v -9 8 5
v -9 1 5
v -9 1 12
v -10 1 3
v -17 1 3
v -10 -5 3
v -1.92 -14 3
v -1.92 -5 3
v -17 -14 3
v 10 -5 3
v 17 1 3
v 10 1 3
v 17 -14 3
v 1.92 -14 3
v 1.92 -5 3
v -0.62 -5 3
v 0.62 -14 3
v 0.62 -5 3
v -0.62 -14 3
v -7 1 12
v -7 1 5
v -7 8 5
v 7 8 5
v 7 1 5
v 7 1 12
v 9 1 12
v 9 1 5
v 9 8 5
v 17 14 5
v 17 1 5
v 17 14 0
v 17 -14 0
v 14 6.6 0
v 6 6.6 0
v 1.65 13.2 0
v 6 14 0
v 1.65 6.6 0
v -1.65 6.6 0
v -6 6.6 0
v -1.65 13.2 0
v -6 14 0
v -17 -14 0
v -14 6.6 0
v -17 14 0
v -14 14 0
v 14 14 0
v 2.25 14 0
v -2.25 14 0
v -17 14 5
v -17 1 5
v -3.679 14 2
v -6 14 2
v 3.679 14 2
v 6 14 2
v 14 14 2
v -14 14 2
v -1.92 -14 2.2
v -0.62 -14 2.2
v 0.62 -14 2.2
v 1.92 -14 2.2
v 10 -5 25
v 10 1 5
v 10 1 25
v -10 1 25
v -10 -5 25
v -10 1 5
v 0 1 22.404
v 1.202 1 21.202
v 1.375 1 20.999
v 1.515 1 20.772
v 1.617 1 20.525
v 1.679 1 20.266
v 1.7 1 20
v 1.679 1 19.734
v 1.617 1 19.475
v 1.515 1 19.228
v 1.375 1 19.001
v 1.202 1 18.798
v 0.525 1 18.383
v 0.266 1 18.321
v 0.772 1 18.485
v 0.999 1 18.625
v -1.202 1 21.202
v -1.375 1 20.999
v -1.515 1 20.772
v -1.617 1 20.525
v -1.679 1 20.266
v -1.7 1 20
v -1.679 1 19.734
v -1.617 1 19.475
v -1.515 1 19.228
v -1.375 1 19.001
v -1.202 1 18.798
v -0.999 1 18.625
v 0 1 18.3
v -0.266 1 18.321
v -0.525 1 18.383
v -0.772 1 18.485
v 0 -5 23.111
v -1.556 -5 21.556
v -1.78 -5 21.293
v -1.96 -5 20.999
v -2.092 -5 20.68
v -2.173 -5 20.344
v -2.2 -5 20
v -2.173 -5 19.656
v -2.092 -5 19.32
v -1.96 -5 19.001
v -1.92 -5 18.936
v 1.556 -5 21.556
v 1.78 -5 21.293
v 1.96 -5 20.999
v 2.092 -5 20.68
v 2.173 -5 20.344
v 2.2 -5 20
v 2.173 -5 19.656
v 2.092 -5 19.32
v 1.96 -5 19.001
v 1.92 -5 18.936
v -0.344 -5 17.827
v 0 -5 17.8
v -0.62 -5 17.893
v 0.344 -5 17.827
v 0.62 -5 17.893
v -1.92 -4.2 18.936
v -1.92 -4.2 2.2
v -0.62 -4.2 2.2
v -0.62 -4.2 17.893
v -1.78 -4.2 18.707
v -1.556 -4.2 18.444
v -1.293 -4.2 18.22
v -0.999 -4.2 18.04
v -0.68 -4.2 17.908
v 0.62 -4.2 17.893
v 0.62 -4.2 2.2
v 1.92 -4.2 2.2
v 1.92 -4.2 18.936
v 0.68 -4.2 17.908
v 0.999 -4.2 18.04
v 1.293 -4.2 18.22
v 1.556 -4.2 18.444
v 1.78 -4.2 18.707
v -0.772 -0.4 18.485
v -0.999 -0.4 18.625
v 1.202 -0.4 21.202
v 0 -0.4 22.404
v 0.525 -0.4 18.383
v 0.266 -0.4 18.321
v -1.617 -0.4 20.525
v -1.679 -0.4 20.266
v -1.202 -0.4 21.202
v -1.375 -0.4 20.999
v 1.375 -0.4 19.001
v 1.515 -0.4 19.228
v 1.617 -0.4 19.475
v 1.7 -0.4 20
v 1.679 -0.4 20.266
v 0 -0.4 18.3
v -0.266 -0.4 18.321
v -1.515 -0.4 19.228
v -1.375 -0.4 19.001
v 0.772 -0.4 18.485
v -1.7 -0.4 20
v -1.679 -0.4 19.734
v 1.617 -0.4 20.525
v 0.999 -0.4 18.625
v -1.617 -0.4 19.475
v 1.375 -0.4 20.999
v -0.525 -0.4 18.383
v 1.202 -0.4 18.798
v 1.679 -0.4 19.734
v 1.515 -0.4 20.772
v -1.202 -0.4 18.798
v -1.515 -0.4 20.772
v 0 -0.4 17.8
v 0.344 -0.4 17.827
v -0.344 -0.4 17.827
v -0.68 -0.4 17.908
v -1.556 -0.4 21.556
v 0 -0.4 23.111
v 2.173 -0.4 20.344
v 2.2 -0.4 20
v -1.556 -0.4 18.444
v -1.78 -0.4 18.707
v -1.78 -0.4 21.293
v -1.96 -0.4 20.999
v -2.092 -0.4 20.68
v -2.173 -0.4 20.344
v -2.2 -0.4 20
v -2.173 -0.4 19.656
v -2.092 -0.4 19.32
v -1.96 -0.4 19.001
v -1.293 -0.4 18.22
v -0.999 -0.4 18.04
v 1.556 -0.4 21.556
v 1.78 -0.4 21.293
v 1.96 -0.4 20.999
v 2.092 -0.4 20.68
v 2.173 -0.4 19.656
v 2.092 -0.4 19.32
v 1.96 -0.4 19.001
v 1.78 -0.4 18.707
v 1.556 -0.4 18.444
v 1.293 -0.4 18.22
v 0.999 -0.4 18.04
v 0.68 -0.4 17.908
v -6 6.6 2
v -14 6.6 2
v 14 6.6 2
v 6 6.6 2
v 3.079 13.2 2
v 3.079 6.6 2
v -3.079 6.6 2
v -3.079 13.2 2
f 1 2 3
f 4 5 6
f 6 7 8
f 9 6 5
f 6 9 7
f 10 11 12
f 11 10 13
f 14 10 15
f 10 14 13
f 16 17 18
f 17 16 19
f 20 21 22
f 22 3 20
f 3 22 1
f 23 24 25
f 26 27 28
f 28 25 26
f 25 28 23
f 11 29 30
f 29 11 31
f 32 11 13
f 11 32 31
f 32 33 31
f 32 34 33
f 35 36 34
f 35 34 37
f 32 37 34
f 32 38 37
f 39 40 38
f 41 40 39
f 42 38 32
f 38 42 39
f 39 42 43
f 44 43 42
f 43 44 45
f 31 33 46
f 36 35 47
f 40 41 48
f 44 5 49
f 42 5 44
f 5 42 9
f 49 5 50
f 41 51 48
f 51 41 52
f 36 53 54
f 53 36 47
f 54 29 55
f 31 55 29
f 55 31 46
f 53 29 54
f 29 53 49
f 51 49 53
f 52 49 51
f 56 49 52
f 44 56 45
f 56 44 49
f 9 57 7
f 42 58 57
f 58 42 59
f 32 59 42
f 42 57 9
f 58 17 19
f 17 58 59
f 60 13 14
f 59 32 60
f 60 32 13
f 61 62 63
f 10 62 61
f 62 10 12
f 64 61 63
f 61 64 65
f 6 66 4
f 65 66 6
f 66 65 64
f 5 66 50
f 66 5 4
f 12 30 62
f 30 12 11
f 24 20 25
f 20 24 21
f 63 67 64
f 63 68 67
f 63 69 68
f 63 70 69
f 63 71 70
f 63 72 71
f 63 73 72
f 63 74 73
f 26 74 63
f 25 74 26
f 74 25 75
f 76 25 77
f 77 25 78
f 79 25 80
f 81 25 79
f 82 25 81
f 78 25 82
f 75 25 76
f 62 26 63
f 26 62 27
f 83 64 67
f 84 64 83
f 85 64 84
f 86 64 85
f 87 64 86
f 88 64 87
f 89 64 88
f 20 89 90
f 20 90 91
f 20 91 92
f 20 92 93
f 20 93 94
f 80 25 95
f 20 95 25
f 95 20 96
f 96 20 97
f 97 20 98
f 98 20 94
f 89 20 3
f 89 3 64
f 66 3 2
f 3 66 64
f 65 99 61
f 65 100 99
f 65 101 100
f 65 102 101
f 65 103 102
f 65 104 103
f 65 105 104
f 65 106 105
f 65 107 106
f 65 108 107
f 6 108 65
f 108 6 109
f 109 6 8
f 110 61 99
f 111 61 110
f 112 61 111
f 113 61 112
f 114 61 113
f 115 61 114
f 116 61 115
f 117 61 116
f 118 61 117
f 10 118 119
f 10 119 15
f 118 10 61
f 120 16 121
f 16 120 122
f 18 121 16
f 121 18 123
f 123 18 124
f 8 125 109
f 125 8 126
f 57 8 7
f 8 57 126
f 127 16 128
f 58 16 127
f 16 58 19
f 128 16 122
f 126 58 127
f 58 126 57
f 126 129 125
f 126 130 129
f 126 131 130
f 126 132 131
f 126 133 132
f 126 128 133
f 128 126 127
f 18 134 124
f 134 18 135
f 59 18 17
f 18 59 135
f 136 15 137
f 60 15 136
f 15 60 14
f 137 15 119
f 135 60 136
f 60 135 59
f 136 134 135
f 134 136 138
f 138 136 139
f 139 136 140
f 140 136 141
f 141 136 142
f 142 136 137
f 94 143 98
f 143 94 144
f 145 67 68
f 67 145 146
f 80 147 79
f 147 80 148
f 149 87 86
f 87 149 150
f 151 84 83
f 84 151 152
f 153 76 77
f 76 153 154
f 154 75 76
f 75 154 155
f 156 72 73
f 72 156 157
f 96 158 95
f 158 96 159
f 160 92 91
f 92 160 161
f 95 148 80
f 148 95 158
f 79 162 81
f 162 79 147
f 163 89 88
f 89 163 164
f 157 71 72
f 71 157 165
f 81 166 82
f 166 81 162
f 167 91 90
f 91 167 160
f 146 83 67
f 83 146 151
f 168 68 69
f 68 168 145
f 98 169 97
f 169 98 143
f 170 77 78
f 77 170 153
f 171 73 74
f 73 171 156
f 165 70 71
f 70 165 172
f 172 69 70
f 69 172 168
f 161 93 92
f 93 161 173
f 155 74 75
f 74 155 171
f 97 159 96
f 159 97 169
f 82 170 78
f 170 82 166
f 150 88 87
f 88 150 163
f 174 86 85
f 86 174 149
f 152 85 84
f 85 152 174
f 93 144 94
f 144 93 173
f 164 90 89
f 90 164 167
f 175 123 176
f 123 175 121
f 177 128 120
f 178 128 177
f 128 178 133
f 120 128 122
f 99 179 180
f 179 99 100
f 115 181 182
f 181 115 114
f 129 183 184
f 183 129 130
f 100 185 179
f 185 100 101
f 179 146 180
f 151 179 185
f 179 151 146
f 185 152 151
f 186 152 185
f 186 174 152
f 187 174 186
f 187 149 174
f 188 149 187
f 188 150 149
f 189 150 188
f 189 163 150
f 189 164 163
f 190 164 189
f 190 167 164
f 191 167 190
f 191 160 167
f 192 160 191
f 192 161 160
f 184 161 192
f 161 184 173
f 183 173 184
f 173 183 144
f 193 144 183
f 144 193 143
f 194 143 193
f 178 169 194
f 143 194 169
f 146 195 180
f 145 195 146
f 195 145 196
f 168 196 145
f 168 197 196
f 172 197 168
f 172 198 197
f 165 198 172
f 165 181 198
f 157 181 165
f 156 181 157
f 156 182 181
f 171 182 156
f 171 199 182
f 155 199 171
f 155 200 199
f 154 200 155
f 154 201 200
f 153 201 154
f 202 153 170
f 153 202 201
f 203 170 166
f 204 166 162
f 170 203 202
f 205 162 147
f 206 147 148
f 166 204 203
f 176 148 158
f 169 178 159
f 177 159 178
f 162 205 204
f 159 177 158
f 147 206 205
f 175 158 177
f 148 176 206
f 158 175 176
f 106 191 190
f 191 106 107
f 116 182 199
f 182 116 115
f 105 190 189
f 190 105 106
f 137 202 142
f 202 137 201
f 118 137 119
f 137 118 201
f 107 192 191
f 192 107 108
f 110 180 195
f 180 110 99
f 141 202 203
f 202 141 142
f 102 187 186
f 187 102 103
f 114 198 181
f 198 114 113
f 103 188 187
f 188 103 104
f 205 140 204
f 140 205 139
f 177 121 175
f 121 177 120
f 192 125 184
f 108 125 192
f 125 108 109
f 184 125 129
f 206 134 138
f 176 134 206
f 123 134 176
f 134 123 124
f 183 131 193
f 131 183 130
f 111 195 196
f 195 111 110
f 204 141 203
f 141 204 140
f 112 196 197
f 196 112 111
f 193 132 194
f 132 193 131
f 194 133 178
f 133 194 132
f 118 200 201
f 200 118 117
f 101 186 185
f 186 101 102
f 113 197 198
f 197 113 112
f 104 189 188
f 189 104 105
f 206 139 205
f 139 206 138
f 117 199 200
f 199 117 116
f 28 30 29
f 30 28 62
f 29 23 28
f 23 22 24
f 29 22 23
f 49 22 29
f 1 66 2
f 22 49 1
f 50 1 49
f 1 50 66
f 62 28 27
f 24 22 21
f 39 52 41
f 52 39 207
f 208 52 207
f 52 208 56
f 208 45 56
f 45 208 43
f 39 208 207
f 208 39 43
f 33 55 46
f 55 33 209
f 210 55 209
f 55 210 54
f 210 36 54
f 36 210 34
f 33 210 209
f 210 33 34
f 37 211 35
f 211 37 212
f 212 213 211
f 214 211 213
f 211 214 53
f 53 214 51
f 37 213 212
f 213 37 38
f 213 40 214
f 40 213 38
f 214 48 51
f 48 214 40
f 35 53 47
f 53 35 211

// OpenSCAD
// file: fixed_ir_source_34mm.scad
// Units: mm. Printable: source_stand, detector_cradle. Other selectors are illustrative proxies.
// Direct grooves, uniform recessed-seat upright, square wall/base junction.
$fn=40;
part="source_stand";
axis_z=20; foot_t=3; bore_d=3.4;
// Uniform wall, no lower block/heel. Front plane remains Y=+1.
plate_t=6; plate_front_y=1; wall_rear_y=plate_front_y-plate_t;
seat_land_t=1.4; flange_seat_y=plate_front_y-seat_land_t;
flange_clearance_d=4.4;
// Independent rectangular open channels, deliberately square at their junction.
lead_pitch=2.54; lead_slot_w=1.3; wall_groove_depth=0.8; base_groove_depth=0.8;
wall_floor_y=wall_rear_y+wall_groove_depth;
base_floor_z=foot_t-base_groove_depth;
// Unmeasured hardware PROXIES. The guide's 2 mm clearance is not a radius spec.
lead_proxy_d=0.8; flange_proxy_t=0.5; flange_proxy_d=3.85;
flange_axial_allowance=1; straight_min_design=2;
upper_bend_r=1.2; base_bend_r=1.2; arc_step=2;
seal_proxy_y=flange_seat_y-flange_proxy_t;
lead_wall_y=wall_floor_y-lead_proxy_d/2;
lead_base_z=base_floor_z+lead_proxy_d/2;
upper_start_y=lead_wall_y+upper_bend_r;
straight_near_seal=seal_proxy_y-upper_start_y;
base_cy=lead_wall_y-base_bend_r; base_cz=lead_base_z+base_bend_r;
assert(lead_pitch-lead_slot_w>=1.2,"Keep separating web >=1.2");
assert(plate_t-wall_groove_depth>=1.2 && seat_land_t>=1.2,"Keep wall/seat material");
assert(base_floor_z>=2,"Keep substantial base floor");
assert(flange_seat_y-flange_axial_allowance-upper_start_y>=straight_min_design-0.001,
       "Increase uniform wall thickness for actual flange/straight/bend requirements");
assert(flange_clearance_d>=4.1+0.3-0.001,"Flange loading clearance");
assert(lead_slot_w>lead_proxy_d && wall_groove_depth>=lead_proxy_d,"Slip groove envelope");
slot_front=-13; slot_rear=7; floor_z=8;
datum_inner_x=22.5; datum_outer_x=25;
datum_y_min=-6; datum_y_max=-2; datum_top_z=14;
assert(datum_inner_x>22,"Body side clearance");
assert(datum_y_min > -8.4 && datum_y_max < 2.4,"Panel corridors stay open");
assert(axis_z==floor_z+15-3,"V11 aperture height mismatch");
assert(slot_front < -12.4 && slot_rear > 6.4,"Full shell clearance");
module box(a,b){translate(a) cube(b-a);}
module across_x(points,half_w){
 multmatrix([[0,0,1,0],[1,0,0,0],[0,1,0,0],[0,0,0,1]])
  linear_extrude(2*half_w,center=true) polygon(points);
}
module roofed_circle(d,y0,y1){
 translate([0,(y0+y1)/2,axis_z]) rotate([90,0,0])
  linear_extrude(y1-y0,center=true)
   polygon(concat([for(a=[135:9:405]) [d/2*cos(a),d/2*sin(a)]],[[0,d/2*sqrt(2)]]));
}
module direct_groove(x){
 // One L-shaped cut: exact square root at [wall_floor_y,base_floor_z].
 // Upper end opens fully into the LED loading recess; no blind roof/lip.
 translate([x,0,0]) across_x([
  [-14.1,base_floor_z],[wall_floor_y,base_floor_z],
  [wall_floor_y,axis_z],[wall_rear_y-0.1,axis_z],
  [wall_rear_y-0.1,foot_t+0.1],[-14.1,foot_t+0.1]],lead_slot_w/2);
}
module source_stand(){
 difference(){
  union(){
   box([-17,-14,0],[17,14,foot_t]);
   box([-10,wall_rear_y,foot_t],[10,plate_front_y,25]);
   for(x=[-9,7]) translate([x,0,0]) rotate([90,0,90])
    linear_extrude(2) polygon([[0,foot_t],[10,foot_t],[0,13]]);
  }
  roofed_circle(bore_d,wall_rear_y-0.1,plate_front_y+0.1);
  // Rear-loaded seat; flange front rests on the 1.4 mm bore land at Y=-0.4.
  roofed_circle(flange_clearance_d,wall_rear_y-0.1,flange_seat_y);
  for(x=[-lead_pitch/2,lead_pitch/2]) direct_groove(x);
 }
}
// Two ordinary 90-degree conductor bends. CAD junction remains square.
function lead_route(x)=concat([[x,seal_proxy_y,axis_z]],
 [for(a=[0:arc_step:90])
  [x,upper_start_y-upper_bend_r*sin(a),axis_z-upper_bend_r+upper_bend_r*cos(a)]],
 [[x,lead_wall_y,base_cz]],
 [for(a=[arc_step:arc_step:90])
  [x,base_cy+base_bend_r*cos(a),base_cz-base_bend_r*sin(a)]],
 [[x,-14,lead_base_z]]);
module tube(points,d){
 // A simple swept proxy mesh keeps previews fast; no hardware STL is exported.
 n=16; m=len(points);
 pts=[for(i=[0:m-1]) let(
  v=points[min(i+1,m-1)]-points[max(i-1,0)],
  normal=[0,-v[2]/norm(v),v[1]/norm(v)])
  for(j=[0:n-1]) points[i]+[d/2*cos(360*j/n),0,0]+normal*d/2*sin(360*j/n)];
 faces=concat([[for(j=[n-1:-1:0]) j]],
  [for(i=[0:m-2]) for(j=[0:n-1]) each
   [[i*n+j,i*n+(j+1)%n,(i+1)*n+(j+1)%n],
    [i*n+j,(i+1)*n+(j+1)%n,(i+1)*n+j]]],
  [[for(j=[0:n-1]) (m-1)*n+j]]);
 polyhedron(pts,faces,convexity=10);
}
module led_proxy(){
 color("crimson") translate([0,flange_seat_y,axis_z]) rotate([-90,0,0]) cylinder(d=3,h=4.8);
 color("darkred") translate([0,seal_proxy_y,axis_z]) rotate([-90,0,0])
  cylinder(d=flange_proxy_d,h=flange_proxy_t);
 for(s=[-1,1]) color(s<0 ? "gold" : "silver") tube(lead_route(s*lead_pitch/2),lead_proxy_d);
}
module source_route_preview(){color("seagreen") source_stand(); led_proxy();}
module source_section_preview(){
 // Cut through positive lead center. Section is illustrative, not another part.
 color("seagreen") intersection(){source_stand();box([-17,-20,-1],[lead_pitch/2,15,26]);}
 led_proxy();
}
module source_entry_preview(){
 // Magnified cutaway of the real modeled seat/entry; hardware is illustrative.
 intersection(){source_section_preview();box([-17,-10,16],[17,8,25.5]);}
}
module detector_cradle(){
 union(){
  box([-25,-19,0],[25,13,floor_z]);
  box([-25,-19,floor_z-0.1],[25,slot_front,14]);
  box([-25,slot_rear,floor_z-0.1],[25,13,14]);
  // Fixed body-only datum tabs; 0.5 mm nominal gap, no clamping preload.
  for(side=[-1,1]) scale([side,1,1])
   box([datum_inner_x,datum_y_min,floor_z-0.1],
       [datum_outer_x,datum_y_max,datum_top_z]);
 }
}
// PROXY ONLY: V11 complete shell, shutter and cover envelopes. Not printable jig.
// Exact datum transform: original x,y,z -> world -x,-z,23-y.
module v11_pose(){translate([0,0,23]) rotate([0,180,0]) rotate([90,0,0]) children();}
module proxy_v11(offset=0){v11_pose(){
 color("slategray") difference(){
  union(){box([-22,-15,0],[22,15,8]);
   for(y=[-15,11.8]) box([-22,y,-6.4],[22,y+3.2,12.4]);}
  for(x=[-5,5]) translate([x,3,-7]) cylinder(d=2,h=21);
 }
 color("orange") translate([offset,0,0]) difference(){
  box([-34,-13,8.4],[22,13,10.4]);
  for(x=[-5,5]) translate([x,3,8]) cylinder(d=4,h=3);
 }
 color("gold") box([-28,-13,-4.4],[21,13,-2.4]);
 // Upward wire proxies, no polarity or channel assignment.
 color("silver") for(x=[-6.27,-3.73,3.73,6.27])
  box([x-0.25,-24,-1.4],[x+0.25,-14,-0.8]);
}}
source_x=0; // -5 left-body-edge, 0 centered, +5 right-body-edge registration
module assembly_preview(){
 color([0.6,0.5,0.35,0.25]) box([-65,-65,-2],[65,35,0]); // board proxy only
 color("teal") detector_cradle();
 proxy_v11();
 // Butted feet: local source +14 meets cradle -19; proxy lens gap 18.2.
 translate([source_x,-33,0]){
  color("seagreen") source_stand();
  led_proxy();
 }
 color([1,0,0,0.4]) translate([source_x,-28.6,axis_z]) rotate([-90,0,0]) cylinder(d=0.35,h=18.2);
}
if(part=="source_stand") source_stand();
else if(part=="detector_cradle") detector_cradle();
else if(part=="assembly") assembly_preview();
else if(part=="source_route") source_route_preview();
else if(part=="section") source_section_preview();
else if(part=="entry") source_entry_preview();
else assert(false,"Unknown part");
// main file
// SPDX-License-Identifier: CERN-OHL-S-2.0
// Quantyra / Daniel Eric Fredriksen baseline; see ATTRIBUTION.md.
// Millimetres. Only stand/cradle selectors are printable parts.
use <fixed_ir_source_34mm.scad>

part="stand";
station="left"; // View FROM source TOWARD jig: left=-world X, right=+world X.
petg_clearance=0.25; // EACH horizontal X flank.
socket_top_clearance=0.60; // Independent seated roof gap, all three stand pockets.
docking_foot_t=5; // Local front apron only; do not raise optics/rear lead grooves.
tongue_length=7;
tongue_h=1.4;
tongue_base_w=2.8;
tongue_top_w=4.8;
tip_leadin=1;
tip_narrow=0.6; // each side, only at tip
mouth_leadin=0.8;
mouth_extra=0.6; // each side at open mouth
end_clearance=0.4;
relief_w=8;
withdraw=0; // positive towards user (-world Y); 7.2 clears both tongues
source_x=station=="left" ? -5 : 5;
show_proxy=true;
$fn=40;

assert(station=="left" || station=="right");
assert(petg_clearance>=0.20 && petg_clearance<=0.30,
       "Reviewed parameter range: 0.20..0.30 mm per horizontal flank");
assert(tongue_length==7 && tongue_h==1.4 && tongue_base_w==2.8 && tongue_top_w==4.8,
       "Re-run geometry review if changing tongue proportions");
assert(docking_foot_t-tongue_h-socket_top_clearance>=3-0.001);
assert(socket_top_clearance==0.60 && docking_foot_t==5,
       "Re-run geometry review if changing the front apron or roof gap");

module block(lo,hi){translate(lo) cube(hi-lo);}
module xz_section(points,y0,y1){
 translate([0,y1,0]) rotate([90,0,0]) linear_extrude(y1-y0) polygon(points);
}
function tongue_section(n=0)=[[-tongue_base_w/2+n,0],
 [tongue_base_w/2-n,0],[tongue_top_w/2-n,tongue_h],
 [-tongue_top_w/2+n,tongue_h]];
module male_tongue(){
 // Flat sole, 35.5 degree outward growth from vertical; no support needed.
 xz_section(tongue_section(),-19-tongue_length+tip_leadin,-18.9);
 hull(){
  xz_section(tongue_section(tip_narrow),-19-tongue_length,-19-tongue_length+0.01);
  xz_section(tongue_section(),-19-tongue_length+tip_leadin-0.01,-19-tongue_length+tip_leadin);
 }
}
function socket_half(z,c,extra=0)=tongue_base_w/2+
 (tongue_top_w-tongue_base_w)/2/tongue_h*z+c+extra;
// Default preserves extension receivers; only the stand requests the taller void.
function socket_section(c,extra=0,top_clearance=undef)=
 let(z0=-0.1,z1=tongue_h+(is_undef(top_clearance) ? c : top_clearance))
 [[-socket_half(z0,c,extra),z0],[socket_half(z0,c,extra),z0],
 [socket_half(z1,c,extra),z1],[-socket_half(z1,c,extra),z1]];
module female_voids(c=petg_clearance){
 // Sole-open dovetail: full sloped flanks continue to Z=2, not a clipped roof.
 // Ceiling <=6.258 mm; flared mouth <=7.458; roof 3 mm; mouth webs >=2.271.
 xz_section(socket_section(c,0,socket_top_clearance),14-tongue_length-end_clearance,14.1);
 hull(){
  xz_section(socket_section(c,0,socket_top_clearance),14-mouth_leadin,14-mouth_leadin+0.01);
  xz_section(socket_section(c,mouth_extra,socket_top_clearance),14,14.1);
 }
 // Loose rectangular blind pockets, NOT additional captured sockets.
 // 8 mm roof bridges, 3 mm outer bearing strips; retain all butt faces above.
 for(x=[-10,10]) block([x-relief_w/2,14-tongue_length-end_clearance,-0.1],
                       [x+relief_w/2,14.1,tongue_h+socket_top_clearance]);
}
module keyed_stand(c=petg_clearance){
 difference(){
  union(){
   source_stand();
   // Add above the existing sole only in front of the upright. Rear grooves
   // end behind Y=-4.2; source seat and Z=20 axis remain untouched.
   block([-17,1,2.9],[17,14,docking_foot_t]);
  }
  female_voids(c);
 }
}
module port_labels(){
 // Additive letters on the front rail; outside the original jig slot/datum.
 for(i=[0,1]) translate([i==0 ? -5 : 5,-16,13.99])
  linear_extrude(0.41) text(i==0 ? "L" : "R",size=2.4,
                         font="Liberation Sans:style=Bold",halign="center",valign="center");
}
module keyed_cradle(){
 detector_cradle();
 for(x=[-5,5]) translate([x,0,0]) male_tongue();
 port_labels();
}
module placed_stand(x=source_x,t=withdraw,c=petg_clearance){
 translate([x,-33-t,0]) keyed_stand(c);
}
module fixture_scene(){
 color([0.10,0.40,0.53]) render(convexity=10) keyed_cradle();
 color([0.94,0.61,0.18]) render(convexity=10) placed_stand();
 if(show_proxy){proxy_v11();translate([source_x,-33-withdraw,0]) led_proxy();}
 color([0.95,0.12,0.12]) translate([source_x,-28.6-withdraw,20])
  rotate([-90,0,0]) cylinder(d=0.3,h=18.2+withdraw);
}

if(part=="stand") keyed_stand();
else if(part=="cradle") keyed_cradle();
else if(part=="assembly") fixture_scene();
else if(part=="underside"){
 color([0.94,0.61,0.18]) render(convexity=10) translate([0,0,3]) rotate([0,180,0]) keyed_stand();
}
else if(part=="detail"){
 color([0.94,0.61,0.18]) render(convexity=10) intersection(){placed_stand();block([-24,-29,-1],[24,-18,1.1]);}
 color([0.1,0.4,0.53]) render(convexity=10) intersection(){keyed_cradle();block([-24,-29,-1],[24,-16,3]);}
}
else if(part=="print"){
 color([0.94,0.61,0.18]) render(convexity=10) translate([-34,0,0]) keyed_stand();
 color([0.1,0.4,0.53]) render(convexity=10) translate([24,0,0]) keyed_cradle();
}
else assert(false,"Unknown selector");
